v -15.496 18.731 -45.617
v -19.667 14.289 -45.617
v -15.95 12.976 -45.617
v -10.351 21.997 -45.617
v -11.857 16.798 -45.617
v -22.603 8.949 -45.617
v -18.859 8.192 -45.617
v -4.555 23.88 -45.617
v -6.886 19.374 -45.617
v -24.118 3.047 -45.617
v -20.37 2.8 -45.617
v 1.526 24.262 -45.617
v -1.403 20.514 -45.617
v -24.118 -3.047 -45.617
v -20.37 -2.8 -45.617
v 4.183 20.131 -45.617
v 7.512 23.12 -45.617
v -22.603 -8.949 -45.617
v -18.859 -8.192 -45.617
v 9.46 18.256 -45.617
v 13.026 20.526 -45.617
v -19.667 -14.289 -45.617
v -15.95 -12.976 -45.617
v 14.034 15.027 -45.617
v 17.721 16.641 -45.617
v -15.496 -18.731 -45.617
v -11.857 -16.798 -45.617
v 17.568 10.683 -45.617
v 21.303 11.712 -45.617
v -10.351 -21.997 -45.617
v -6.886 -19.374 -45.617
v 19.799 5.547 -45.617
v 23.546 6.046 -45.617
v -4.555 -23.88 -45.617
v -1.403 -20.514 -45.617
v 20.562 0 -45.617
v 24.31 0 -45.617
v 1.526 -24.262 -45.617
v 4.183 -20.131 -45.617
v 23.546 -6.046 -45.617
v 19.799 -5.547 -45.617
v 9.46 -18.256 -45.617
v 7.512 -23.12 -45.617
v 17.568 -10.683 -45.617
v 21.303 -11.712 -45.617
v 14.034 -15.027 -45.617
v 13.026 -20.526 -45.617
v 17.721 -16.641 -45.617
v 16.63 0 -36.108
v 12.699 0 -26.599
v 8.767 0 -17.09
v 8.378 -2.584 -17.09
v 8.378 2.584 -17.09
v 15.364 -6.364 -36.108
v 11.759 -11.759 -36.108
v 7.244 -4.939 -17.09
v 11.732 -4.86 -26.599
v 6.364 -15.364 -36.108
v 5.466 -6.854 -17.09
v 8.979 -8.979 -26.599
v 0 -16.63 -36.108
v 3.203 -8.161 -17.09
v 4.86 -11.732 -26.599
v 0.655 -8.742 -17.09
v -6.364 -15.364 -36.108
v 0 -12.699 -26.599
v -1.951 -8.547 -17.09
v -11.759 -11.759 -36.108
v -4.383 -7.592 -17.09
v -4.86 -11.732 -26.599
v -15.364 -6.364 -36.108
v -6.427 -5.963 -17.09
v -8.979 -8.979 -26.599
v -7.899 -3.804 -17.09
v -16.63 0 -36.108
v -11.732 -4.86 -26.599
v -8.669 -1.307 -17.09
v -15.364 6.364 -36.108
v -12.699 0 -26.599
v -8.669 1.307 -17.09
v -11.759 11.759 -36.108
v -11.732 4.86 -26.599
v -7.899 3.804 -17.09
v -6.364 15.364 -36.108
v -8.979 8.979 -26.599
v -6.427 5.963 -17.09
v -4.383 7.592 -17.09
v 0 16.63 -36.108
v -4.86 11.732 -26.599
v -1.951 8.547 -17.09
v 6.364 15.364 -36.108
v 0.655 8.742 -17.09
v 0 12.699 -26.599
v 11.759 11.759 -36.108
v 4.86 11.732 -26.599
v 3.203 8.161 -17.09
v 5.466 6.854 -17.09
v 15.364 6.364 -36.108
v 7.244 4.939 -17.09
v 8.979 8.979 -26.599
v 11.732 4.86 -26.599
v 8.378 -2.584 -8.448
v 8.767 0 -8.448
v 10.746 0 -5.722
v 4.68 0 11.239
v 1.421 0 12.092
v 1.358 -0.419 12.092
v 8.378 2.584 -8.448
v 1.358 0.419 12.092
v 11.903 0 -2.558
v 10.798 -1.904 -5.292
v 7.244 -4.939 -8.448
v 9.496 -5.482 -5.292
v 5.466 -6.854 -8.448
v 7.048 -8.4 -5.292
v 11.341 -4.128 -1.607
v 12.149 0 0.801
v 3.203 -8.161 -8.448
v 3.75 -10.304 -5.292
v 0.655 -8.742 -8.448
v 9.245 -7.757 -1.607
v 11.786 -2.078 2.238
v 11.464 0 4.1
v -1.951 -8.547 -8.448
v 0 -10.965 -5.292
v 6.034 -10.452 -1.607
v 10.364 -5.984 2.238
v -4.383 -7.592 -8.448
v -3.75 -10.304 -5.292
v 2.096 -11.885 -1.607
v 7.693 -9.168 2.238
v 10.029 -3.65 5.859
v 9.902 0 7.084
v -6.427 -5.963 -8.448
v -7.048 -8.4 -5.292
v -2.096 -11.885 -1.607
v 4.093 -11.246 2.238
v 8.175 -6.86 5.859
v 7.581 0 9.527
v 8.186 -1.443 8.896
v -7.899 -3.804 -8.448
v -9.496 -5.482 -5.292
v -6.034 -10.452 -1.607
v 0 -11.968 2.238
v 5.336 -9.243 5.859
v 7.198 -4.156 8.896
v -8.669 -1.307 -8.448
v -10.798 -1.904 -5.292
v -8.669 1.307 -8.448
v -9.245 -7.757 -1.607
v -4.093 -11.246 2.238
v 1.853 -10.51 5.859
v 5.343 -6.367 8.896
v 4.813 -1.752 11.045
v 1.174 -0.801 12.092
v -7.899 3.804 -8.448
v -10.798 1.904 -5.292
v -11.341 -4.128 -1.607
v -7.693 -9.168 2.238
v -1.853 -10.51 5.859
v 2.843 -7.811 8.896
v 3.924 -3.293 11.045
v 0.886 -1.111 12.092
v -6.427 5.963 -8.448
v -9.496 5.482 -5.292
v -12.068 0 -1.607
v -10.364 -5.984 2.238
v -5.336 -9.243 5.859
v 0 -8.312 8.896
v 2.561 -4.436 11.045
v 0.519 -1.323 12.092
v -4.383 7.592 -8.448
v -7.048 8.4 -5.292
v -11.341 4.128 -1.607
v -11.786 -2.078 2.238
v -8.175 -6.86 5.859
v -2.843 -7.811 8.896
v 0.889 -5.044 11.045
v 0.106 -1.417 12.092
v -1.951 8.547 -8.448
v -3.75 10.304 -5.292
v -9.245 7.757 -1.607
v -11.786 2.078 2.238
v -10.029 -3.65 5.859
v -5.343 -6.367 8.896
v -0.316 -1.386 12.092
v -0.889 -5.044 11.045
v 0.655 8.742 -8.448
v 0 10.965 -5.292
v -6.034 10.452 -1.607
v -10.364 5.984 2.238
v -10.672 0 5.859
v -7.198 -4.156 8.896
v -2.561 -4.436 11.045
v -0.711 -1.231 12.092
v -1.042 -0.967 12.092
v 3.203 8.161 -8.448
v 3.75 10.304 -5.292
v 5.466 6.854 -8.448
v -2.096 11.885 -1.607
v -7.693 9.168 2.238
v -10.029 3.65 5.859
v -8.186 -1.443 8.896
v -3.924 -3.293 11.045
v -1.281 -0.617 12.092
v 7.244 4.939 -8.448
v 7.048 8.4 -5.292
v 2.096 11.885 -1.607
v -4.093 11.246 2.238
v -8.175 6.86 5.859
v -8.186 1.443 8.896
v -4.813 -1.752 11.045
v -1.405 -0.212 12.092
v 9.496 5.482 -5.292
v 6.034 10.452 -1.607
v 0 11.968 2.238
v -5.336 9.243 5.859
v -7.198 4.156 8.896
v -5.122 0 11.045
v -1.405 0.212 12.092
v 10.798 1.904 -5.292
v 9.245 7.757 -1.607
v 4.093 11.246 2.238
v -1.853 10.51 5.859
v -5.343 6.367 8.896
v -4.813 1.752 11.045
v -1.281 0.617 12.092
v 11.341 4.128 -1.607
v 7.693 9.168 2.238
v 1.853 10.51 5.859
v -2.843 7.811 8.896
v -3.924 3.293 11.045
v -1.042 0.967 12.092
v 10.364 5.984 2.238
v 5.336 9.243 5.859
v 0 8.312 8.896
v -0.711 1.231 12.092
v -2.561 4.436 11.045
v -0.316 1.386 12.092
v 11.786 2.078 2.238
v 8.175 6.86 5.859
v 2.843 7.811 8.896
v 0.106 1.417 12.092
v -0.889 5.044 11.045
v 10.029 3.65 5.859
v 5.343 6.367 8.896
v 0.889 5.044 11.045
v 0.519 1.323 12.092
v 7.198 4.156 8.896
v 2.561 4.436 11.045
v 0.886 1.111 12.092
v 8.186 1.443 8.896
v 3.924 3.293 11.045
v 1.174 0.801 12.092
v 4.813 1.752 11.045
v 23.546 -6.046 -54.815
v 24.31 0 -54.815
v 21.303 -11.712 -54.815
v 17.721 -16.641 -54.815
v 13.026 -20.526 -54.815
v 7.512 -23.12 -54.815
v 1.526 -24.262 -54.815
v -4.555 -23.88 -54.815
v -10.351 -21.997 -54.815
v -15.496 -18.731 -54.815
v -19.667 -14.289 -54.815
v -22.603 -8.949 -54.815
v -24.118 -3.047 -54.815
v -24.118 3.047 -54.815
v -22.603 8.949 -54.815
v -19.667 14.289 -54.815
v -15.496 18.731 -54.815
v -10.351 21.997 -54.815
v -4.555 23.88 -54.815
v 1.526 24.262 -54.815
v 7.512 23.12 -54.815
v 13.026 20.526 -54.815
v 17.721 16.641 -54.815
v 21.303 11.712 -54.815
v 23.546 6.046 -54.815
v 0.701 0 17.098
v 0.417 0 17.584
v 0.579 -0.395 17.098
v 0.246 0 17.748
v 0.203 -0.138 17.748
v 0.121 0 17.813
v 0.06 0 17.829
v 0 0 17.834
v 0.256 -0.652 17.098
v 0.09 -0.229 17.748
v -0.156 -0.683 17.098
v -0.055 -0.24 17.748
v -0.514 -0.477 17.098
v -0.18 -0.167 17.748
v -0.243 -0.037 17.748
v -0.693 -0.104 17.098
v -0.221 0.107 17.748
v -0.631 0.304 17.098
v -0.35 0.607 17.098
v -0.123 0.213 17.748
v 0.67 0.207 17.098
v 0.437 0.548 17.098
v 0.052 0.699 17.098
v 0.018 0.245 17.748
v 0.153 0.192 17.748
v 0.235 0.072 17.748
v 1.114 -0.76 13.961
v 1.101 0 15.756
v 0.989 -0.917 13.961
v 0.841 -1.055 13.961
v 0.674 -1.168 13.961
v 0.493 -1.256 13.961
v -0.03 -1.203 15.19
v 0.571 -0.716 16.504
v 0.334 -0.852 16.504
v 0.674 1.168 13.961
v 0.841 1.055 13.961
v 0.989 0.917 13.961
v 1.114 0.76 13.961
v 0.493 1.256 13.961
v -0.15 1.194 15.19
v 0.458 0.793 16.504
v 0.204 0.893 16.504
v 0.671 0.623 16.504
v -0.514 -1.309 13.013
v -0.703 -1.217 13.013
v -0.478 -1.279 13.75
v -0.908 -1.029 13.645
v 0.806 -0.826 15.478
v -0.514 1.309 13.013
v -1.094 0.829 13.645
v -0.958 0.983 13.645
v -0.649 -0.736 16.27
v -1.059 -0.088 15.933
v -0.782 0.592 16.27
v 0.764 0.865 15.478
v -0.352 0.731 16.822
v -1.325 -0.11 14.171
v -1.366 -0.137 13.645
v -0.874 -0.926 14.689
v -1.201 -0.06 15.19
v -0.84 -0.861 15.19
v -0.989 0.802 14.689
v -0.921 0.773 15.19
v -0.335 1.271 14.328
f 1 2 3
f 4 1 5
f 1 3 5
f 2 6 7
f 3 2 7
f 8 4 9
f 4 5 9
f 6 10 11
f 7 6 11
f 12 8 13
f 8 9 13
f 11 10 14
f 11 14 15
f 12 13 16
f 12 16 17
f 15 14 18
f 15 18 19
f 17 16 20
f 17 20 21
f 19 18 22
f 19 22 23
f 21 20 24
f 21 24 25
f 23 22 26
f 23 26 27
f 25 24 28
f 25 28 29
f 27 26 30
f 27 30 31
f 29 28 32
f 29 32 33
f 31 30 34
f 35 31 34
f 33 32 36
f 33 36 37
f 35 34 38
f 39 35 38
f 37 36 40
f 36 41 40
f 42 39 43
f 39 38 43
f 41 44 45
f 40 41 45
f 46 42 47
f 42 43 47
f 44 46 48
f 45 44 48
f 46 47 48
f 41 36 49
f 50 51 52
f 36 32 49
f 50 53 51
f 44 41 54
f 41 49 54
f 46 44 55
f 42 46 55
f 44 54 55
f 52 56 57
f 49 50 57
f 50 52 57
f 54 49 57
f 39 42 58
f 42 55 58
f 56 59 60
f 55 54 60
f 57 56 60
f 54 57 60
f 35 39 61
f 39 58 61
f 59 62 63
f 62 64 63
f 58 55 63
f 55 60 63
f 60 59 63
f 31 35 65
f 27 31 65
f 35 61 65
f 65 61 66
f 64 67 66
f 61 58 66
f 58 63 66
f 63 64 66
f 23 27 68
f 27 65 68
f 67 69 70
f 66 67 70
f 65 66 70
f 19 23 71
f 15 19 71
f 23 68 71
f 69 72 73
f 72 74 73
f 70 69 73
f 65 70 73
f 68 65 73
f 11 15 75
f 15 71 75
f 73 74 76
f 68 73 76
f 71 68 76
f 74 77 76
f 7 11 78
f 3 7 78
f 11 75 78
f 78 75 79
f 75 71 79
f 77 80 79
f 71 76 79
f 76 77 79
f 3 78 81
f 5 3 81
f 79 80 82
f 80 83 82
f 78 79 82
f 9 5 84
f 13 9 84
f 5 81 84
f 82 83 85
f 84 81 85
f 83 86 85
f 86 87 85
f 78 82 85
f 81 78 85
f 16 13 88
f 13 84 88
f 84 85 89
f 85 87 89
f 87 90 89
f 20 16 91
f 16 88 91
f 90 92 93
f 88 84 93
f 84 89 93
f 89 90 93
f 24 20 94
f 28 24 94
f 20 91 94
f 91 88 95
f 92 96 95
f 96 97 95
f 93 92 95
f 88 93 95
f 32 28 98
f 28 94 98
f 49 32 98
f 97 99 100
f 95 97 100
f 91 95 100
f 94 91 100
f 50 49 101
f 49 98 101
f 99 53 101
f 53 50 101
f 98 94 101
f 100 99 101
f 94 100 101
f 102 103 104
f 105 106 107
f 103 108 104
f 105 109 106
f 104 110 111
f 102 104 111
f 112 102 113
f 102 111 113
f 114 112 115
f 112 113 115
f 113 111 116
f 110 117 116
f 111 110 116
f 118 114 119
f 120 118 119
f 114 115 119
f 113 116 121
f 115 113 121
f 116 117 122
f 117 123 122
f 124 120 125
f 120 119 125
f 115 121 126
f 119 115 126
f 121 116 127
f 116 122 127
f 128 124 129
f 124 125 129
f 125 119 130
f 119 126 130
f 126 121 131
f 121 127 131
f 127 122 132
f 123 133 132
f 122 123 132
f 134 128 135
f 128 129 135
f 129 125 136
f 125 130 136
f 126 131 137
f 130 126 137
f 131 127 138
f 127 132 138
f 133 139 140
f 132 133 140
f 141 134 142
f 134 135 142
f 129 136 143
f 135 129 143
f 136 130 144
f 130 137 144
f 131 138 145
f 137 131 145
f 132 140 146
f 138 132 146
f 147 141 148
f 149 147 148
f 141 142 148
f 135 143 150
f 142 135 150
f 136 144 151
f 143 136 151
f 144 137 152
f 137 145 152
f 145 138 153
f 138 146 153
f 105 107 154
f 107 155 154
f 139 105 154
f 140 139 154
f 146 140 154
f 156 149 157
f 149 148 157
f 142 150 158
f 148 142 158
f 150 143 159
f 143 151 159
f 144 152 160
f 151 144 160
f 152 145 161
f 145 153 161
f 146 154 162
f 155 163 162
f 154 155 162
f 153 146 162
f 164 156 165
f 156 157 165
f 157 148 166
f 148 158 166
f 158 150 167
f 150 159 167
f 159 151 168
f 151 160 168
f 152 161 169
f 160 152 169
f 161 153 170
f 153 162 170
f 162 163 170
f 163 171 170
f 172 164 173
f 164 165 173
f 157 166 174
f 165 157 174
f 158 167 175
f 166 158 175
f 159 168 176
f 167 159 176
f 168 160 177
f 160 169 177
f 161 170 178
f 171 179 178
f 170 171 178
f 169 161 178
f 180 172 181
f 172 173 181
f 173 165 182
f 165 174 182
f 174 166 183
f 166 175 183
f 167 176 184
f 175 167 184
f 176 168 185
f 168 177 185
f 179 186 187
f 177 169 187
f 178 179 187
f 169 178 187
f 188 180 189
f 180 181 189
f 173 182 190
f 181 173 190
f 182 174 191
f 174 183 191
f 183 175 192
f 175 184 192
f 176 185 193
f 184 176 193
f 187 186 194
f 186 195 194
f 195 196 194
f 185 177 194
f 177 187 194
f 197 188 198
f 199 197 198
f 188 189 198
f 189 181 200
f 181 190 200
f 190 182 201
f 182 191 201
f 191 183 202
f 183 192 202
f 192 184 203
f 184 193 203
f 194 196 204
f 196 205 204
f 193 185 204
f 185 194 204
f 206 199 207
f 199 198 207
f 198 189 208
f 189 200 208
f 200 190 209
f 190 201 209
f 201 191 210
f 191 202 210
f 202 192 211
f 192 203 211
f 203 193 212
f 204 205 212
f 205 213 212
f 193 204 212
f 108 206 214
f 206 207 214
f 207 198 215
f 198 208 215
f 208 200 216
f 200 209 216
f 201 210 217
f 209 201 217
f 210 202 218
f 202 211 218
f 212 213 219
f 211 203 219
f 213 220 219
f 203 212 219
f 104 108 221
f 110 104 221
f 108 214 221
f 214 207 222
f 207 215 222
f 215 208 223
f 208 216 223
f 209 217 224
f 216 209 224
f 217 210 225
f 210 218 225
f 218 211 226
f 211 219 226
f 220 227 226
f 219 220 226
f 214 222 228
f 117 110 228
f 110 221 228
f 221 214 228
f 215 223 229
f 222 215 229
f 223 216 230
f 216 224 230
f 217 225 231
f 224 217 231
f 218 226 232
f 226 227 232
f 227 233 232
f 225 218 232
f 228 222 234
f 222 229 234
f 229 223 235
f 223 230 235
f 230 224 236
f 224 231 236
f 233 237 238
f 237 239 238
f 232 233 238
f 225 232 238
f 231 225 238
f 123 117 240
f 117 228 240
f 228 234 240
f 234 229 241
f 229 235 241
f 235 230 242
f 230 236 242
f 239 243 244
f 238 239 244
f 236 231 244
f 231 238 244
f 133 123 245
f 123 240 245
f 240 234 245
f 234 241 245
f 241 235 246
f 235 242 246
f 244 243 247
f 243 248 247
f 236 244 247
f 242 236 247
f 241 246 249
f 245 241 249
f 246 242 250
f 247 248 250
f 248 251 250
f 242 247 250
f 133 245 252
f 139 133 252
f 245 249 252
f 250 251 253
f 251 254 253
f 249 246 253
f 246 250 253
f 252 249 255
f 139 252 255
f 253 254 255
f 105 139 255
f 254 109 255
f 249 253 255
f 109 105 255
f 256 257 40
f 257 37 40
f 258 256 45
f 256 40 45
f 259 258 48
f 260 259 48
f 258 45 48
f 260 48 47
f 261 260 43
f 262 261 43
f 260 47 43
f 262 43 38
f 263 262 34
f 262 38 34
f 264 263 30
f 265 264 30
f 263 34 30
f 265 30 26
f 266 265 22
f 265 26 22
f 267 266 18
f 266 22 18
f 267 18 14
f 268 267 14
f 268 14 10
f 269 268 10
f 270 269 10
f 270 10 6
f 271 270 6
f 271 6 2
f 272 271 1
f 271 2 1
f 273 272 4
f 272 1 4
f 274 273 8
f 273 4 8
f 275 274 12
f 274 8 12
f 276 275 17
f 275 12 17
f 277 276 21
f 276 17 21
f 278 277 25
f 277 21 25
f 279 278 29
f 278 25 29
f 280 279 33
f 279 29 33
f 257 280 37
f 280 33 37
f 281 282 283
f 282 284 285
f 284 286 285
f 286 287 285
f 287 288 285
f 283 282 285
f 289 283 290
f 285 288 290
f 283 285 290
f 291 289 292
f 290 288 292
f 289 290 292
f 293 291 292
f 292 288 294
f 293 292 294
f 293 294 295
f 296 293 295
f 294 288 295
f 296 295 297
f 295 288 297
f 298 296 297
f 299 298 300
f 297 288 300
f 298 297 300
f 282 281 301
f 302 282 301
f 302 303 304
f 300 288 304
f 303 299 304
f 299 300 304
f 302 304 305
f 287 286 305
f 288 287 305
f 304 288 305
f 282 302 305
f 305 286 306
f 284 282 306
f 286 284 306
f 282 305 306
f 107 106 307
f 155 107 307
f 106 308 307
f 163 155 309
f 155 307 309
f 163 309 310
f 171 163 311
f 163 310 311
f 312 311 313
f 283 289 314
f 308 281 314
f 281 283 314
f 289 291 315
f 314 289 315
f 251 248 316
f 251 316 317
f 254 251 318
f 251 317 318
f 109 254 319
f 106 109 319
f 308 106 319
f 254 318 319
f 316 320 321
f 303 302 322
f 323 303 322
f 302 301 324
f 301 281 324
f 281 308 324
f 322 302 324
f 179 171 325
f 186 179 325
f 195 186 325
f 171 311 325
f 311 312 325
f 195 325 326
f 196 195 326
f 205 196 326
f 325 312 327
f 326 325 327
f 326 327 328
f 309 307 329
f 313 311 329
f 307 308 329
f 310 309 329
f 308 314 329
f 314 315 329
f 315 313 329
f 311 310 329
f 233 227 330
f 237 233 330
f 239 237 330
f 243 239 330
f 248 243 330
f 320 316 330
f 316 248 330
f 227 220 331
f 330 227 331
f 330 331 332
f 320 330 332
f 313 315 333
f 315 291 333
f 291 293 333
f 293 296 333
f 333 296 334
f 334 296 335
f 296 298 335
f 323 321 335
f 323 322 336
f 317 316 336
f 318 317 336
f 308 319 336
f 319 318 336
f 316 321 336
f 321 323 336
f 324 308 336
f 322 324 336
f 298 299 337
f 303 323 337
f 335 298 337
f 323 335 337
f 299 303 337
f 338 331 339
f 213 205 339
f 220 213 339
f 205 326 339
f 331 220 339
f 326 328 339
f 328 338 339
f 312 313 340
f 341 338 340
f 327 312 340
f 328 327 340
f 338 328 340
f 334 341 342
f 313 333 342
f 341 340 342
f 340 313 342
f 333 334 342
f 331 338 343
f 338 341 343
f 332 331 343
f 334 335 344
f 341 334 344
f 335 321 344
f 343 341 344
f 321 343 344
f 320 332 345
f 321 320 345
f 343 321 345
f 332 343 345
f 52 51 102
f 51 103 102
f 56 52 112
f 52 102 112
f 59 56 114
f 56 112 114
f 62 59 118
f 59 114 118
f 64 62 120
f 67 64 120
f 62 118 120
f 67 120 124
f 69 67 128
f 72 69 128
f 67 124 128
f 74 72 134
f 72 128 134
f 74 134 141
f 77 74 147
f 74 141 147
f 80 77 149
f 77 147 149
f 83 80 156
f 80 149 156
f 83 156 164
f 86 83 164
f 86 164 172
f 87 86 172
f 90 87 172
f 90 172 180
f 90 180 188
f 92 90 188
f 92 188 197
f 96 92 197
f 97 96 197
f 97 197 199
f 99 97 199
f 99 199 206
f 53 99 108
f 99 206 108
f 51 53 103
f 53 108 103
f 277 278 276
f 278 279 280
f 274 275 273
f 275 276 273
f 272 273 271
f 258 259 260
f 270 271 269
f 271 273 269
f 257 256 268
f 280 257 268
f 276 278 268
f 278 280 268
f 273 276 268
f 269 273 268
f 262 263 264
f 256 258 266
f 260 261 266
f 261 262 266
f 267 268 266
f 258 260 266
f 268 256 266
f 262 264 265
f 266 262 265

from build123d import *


with BuildPart() as f1:
    # F0 (on Front) → F1 (revolve)
    with BuildSketch(Plane.XZ):
        with BuildLine():
            Line((0, 17.8337320685), (0, -54.8152588308))
            Line((0, -54.8152588308), (24.3101920933, -54.8152588308))
            Line((24.3101920933, -54.8152588308), (24.3101920933, -45.6168055534))
            Line((24.3101920933, -45.6168055534), (20.561552414, -45.6168055534))
            Line((20.561552414, -45.6168055534), (8.7669930706, -17.0896715711))
            Line((8.7669930706, -17.0896715711), (8.7669930706, -8.4479902372))
            ThreePointArc((8.7669930706, -8.4479902372), (11.4638422011, 4.0998815271), (1.4212700133, 12.0916788783))
            add(Edge.make_bspline(
                [(1.4212700133, 12.0916788783), (1.4424893444, 17.8337320685), (0, 17.8337320685)],
                knots=[4.6976782329, 4.6976782329, 4.6976782329, 6.2831853072, 6.2831853072, 6.2831853072], degree=2, weights=[1, 0.7018866658, 1]))
        make_face()
    revolve(axis=Axis((0, 0, 0.3754459321), (0, 0, -1)))


solid = f1.part
